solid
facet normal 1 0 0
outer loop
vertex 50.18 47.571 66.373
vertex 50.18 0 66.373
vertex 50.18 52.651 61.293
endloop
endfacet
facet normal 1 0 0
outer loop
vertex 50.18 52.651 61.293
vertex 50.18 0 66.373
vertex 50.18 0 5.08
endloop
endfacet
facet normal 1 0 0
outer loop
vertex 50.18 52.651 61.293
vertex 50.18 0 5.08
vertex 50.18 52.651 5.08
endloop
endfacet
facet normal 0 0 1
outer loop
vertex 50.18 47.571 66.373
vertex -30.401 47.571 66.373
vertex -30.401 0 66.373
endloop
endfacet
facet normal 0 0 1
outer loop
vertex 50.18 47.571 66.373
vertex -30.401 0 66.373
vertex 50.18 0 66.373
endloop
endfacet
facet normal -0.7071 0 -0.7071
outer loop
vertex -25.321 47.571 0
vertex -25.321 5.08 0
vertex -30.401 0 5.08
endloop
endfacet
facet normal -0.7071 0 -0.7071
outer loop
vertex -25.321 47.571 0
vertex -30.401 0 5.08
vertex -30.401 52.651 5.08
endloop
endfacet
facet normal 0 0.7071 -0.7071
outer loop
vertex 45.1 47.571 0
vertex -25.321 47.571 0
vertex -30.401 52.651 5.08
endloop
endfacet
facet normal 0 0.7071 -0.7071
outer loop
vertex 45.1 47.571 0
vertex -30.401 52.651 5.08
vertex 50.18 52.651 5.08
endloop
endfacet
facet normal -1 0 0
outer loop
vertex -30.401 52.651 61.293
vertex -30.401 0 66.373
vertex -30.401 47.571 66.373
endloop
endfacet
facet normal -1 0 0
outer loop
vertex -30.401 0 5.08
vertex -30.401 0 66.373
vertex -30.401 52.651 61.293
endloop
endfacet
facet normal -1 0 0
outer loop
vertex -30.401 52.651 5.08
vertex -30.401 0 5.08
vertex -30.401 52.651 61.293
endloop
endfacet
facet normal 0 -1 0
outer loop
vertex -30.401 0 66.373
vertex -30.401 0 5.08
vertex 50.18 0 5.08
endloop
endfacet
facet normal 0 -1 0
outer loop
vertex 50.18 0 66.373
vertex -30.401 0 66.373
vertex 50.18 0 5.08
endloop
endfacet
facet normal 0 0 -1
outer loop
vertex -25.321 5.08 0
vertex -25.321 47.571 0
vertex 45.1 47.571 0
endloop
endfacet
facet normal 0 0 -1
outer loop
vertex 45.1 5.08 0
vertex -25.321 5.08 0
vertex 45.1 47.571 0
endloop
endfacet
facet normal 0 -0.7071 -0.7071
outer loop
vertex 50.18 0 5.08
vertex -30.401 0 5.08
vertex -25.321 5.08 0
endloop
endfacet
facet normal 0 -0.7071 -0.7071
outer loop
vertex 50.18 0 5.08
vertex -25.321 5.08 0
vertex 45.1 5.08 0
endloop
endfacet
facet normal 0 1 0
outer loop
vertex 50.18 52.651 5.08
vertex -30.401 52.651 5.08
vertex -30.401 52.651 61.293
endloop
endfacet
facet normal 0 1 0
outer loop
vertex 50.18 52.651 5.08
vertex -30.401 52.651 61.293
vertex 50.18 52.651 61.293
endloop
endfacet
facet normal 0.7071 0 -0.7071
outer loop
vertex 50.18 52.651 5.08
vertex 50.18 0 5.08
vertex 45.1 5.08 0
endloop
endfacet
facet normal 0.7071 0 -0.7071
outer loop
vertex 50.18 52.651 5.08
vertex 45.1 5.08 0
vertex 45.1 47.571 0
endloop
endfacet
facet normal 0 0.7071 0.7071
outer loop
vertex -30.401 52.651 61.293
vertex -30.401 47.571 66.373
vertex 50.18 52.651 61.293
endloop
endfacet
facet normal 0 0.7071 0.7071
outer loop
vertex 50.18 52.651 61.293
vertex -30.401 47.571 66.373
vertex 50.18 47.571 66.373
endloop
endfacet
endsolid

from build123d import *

# Parameters (mm, degrees)
F0_W     = 80.581218
F0_H     = 52.650921
F1_DEPTH = 66.373251
F2_SIZE  = 5.08
F3_SIZE  = 5.08


with BuildPart() as f1:
    # F0 (on Top) → F1 (new body)
    with BuildSketch(Plane.XY):
        with Locations((9.889513, 26.32546)):
            Rectangle(F0_W, F0_H)
    extrude(amount=F1_DEPTH)

    # F2
    f2_edges = [f1.edges().sort_by_distance(p)[0] for p in [
        (9.889513, 52.650921, 66.373251),
    ]]
    chamfer(f2_edges, length=F2_SIZE)

    # F3
    f3_edges = [f1.edges().sort_by_distance(p)[0] for p in [
        (9.889513, 52.650921, 0),
        (-30.401096, 26.325461, 0),
        (9.889513, 0, 0),
        (50.180122, 26.325461, 0),
    ]]
    chamfer(f3_edges, length=F3_SIZE)


solid = f1.part
